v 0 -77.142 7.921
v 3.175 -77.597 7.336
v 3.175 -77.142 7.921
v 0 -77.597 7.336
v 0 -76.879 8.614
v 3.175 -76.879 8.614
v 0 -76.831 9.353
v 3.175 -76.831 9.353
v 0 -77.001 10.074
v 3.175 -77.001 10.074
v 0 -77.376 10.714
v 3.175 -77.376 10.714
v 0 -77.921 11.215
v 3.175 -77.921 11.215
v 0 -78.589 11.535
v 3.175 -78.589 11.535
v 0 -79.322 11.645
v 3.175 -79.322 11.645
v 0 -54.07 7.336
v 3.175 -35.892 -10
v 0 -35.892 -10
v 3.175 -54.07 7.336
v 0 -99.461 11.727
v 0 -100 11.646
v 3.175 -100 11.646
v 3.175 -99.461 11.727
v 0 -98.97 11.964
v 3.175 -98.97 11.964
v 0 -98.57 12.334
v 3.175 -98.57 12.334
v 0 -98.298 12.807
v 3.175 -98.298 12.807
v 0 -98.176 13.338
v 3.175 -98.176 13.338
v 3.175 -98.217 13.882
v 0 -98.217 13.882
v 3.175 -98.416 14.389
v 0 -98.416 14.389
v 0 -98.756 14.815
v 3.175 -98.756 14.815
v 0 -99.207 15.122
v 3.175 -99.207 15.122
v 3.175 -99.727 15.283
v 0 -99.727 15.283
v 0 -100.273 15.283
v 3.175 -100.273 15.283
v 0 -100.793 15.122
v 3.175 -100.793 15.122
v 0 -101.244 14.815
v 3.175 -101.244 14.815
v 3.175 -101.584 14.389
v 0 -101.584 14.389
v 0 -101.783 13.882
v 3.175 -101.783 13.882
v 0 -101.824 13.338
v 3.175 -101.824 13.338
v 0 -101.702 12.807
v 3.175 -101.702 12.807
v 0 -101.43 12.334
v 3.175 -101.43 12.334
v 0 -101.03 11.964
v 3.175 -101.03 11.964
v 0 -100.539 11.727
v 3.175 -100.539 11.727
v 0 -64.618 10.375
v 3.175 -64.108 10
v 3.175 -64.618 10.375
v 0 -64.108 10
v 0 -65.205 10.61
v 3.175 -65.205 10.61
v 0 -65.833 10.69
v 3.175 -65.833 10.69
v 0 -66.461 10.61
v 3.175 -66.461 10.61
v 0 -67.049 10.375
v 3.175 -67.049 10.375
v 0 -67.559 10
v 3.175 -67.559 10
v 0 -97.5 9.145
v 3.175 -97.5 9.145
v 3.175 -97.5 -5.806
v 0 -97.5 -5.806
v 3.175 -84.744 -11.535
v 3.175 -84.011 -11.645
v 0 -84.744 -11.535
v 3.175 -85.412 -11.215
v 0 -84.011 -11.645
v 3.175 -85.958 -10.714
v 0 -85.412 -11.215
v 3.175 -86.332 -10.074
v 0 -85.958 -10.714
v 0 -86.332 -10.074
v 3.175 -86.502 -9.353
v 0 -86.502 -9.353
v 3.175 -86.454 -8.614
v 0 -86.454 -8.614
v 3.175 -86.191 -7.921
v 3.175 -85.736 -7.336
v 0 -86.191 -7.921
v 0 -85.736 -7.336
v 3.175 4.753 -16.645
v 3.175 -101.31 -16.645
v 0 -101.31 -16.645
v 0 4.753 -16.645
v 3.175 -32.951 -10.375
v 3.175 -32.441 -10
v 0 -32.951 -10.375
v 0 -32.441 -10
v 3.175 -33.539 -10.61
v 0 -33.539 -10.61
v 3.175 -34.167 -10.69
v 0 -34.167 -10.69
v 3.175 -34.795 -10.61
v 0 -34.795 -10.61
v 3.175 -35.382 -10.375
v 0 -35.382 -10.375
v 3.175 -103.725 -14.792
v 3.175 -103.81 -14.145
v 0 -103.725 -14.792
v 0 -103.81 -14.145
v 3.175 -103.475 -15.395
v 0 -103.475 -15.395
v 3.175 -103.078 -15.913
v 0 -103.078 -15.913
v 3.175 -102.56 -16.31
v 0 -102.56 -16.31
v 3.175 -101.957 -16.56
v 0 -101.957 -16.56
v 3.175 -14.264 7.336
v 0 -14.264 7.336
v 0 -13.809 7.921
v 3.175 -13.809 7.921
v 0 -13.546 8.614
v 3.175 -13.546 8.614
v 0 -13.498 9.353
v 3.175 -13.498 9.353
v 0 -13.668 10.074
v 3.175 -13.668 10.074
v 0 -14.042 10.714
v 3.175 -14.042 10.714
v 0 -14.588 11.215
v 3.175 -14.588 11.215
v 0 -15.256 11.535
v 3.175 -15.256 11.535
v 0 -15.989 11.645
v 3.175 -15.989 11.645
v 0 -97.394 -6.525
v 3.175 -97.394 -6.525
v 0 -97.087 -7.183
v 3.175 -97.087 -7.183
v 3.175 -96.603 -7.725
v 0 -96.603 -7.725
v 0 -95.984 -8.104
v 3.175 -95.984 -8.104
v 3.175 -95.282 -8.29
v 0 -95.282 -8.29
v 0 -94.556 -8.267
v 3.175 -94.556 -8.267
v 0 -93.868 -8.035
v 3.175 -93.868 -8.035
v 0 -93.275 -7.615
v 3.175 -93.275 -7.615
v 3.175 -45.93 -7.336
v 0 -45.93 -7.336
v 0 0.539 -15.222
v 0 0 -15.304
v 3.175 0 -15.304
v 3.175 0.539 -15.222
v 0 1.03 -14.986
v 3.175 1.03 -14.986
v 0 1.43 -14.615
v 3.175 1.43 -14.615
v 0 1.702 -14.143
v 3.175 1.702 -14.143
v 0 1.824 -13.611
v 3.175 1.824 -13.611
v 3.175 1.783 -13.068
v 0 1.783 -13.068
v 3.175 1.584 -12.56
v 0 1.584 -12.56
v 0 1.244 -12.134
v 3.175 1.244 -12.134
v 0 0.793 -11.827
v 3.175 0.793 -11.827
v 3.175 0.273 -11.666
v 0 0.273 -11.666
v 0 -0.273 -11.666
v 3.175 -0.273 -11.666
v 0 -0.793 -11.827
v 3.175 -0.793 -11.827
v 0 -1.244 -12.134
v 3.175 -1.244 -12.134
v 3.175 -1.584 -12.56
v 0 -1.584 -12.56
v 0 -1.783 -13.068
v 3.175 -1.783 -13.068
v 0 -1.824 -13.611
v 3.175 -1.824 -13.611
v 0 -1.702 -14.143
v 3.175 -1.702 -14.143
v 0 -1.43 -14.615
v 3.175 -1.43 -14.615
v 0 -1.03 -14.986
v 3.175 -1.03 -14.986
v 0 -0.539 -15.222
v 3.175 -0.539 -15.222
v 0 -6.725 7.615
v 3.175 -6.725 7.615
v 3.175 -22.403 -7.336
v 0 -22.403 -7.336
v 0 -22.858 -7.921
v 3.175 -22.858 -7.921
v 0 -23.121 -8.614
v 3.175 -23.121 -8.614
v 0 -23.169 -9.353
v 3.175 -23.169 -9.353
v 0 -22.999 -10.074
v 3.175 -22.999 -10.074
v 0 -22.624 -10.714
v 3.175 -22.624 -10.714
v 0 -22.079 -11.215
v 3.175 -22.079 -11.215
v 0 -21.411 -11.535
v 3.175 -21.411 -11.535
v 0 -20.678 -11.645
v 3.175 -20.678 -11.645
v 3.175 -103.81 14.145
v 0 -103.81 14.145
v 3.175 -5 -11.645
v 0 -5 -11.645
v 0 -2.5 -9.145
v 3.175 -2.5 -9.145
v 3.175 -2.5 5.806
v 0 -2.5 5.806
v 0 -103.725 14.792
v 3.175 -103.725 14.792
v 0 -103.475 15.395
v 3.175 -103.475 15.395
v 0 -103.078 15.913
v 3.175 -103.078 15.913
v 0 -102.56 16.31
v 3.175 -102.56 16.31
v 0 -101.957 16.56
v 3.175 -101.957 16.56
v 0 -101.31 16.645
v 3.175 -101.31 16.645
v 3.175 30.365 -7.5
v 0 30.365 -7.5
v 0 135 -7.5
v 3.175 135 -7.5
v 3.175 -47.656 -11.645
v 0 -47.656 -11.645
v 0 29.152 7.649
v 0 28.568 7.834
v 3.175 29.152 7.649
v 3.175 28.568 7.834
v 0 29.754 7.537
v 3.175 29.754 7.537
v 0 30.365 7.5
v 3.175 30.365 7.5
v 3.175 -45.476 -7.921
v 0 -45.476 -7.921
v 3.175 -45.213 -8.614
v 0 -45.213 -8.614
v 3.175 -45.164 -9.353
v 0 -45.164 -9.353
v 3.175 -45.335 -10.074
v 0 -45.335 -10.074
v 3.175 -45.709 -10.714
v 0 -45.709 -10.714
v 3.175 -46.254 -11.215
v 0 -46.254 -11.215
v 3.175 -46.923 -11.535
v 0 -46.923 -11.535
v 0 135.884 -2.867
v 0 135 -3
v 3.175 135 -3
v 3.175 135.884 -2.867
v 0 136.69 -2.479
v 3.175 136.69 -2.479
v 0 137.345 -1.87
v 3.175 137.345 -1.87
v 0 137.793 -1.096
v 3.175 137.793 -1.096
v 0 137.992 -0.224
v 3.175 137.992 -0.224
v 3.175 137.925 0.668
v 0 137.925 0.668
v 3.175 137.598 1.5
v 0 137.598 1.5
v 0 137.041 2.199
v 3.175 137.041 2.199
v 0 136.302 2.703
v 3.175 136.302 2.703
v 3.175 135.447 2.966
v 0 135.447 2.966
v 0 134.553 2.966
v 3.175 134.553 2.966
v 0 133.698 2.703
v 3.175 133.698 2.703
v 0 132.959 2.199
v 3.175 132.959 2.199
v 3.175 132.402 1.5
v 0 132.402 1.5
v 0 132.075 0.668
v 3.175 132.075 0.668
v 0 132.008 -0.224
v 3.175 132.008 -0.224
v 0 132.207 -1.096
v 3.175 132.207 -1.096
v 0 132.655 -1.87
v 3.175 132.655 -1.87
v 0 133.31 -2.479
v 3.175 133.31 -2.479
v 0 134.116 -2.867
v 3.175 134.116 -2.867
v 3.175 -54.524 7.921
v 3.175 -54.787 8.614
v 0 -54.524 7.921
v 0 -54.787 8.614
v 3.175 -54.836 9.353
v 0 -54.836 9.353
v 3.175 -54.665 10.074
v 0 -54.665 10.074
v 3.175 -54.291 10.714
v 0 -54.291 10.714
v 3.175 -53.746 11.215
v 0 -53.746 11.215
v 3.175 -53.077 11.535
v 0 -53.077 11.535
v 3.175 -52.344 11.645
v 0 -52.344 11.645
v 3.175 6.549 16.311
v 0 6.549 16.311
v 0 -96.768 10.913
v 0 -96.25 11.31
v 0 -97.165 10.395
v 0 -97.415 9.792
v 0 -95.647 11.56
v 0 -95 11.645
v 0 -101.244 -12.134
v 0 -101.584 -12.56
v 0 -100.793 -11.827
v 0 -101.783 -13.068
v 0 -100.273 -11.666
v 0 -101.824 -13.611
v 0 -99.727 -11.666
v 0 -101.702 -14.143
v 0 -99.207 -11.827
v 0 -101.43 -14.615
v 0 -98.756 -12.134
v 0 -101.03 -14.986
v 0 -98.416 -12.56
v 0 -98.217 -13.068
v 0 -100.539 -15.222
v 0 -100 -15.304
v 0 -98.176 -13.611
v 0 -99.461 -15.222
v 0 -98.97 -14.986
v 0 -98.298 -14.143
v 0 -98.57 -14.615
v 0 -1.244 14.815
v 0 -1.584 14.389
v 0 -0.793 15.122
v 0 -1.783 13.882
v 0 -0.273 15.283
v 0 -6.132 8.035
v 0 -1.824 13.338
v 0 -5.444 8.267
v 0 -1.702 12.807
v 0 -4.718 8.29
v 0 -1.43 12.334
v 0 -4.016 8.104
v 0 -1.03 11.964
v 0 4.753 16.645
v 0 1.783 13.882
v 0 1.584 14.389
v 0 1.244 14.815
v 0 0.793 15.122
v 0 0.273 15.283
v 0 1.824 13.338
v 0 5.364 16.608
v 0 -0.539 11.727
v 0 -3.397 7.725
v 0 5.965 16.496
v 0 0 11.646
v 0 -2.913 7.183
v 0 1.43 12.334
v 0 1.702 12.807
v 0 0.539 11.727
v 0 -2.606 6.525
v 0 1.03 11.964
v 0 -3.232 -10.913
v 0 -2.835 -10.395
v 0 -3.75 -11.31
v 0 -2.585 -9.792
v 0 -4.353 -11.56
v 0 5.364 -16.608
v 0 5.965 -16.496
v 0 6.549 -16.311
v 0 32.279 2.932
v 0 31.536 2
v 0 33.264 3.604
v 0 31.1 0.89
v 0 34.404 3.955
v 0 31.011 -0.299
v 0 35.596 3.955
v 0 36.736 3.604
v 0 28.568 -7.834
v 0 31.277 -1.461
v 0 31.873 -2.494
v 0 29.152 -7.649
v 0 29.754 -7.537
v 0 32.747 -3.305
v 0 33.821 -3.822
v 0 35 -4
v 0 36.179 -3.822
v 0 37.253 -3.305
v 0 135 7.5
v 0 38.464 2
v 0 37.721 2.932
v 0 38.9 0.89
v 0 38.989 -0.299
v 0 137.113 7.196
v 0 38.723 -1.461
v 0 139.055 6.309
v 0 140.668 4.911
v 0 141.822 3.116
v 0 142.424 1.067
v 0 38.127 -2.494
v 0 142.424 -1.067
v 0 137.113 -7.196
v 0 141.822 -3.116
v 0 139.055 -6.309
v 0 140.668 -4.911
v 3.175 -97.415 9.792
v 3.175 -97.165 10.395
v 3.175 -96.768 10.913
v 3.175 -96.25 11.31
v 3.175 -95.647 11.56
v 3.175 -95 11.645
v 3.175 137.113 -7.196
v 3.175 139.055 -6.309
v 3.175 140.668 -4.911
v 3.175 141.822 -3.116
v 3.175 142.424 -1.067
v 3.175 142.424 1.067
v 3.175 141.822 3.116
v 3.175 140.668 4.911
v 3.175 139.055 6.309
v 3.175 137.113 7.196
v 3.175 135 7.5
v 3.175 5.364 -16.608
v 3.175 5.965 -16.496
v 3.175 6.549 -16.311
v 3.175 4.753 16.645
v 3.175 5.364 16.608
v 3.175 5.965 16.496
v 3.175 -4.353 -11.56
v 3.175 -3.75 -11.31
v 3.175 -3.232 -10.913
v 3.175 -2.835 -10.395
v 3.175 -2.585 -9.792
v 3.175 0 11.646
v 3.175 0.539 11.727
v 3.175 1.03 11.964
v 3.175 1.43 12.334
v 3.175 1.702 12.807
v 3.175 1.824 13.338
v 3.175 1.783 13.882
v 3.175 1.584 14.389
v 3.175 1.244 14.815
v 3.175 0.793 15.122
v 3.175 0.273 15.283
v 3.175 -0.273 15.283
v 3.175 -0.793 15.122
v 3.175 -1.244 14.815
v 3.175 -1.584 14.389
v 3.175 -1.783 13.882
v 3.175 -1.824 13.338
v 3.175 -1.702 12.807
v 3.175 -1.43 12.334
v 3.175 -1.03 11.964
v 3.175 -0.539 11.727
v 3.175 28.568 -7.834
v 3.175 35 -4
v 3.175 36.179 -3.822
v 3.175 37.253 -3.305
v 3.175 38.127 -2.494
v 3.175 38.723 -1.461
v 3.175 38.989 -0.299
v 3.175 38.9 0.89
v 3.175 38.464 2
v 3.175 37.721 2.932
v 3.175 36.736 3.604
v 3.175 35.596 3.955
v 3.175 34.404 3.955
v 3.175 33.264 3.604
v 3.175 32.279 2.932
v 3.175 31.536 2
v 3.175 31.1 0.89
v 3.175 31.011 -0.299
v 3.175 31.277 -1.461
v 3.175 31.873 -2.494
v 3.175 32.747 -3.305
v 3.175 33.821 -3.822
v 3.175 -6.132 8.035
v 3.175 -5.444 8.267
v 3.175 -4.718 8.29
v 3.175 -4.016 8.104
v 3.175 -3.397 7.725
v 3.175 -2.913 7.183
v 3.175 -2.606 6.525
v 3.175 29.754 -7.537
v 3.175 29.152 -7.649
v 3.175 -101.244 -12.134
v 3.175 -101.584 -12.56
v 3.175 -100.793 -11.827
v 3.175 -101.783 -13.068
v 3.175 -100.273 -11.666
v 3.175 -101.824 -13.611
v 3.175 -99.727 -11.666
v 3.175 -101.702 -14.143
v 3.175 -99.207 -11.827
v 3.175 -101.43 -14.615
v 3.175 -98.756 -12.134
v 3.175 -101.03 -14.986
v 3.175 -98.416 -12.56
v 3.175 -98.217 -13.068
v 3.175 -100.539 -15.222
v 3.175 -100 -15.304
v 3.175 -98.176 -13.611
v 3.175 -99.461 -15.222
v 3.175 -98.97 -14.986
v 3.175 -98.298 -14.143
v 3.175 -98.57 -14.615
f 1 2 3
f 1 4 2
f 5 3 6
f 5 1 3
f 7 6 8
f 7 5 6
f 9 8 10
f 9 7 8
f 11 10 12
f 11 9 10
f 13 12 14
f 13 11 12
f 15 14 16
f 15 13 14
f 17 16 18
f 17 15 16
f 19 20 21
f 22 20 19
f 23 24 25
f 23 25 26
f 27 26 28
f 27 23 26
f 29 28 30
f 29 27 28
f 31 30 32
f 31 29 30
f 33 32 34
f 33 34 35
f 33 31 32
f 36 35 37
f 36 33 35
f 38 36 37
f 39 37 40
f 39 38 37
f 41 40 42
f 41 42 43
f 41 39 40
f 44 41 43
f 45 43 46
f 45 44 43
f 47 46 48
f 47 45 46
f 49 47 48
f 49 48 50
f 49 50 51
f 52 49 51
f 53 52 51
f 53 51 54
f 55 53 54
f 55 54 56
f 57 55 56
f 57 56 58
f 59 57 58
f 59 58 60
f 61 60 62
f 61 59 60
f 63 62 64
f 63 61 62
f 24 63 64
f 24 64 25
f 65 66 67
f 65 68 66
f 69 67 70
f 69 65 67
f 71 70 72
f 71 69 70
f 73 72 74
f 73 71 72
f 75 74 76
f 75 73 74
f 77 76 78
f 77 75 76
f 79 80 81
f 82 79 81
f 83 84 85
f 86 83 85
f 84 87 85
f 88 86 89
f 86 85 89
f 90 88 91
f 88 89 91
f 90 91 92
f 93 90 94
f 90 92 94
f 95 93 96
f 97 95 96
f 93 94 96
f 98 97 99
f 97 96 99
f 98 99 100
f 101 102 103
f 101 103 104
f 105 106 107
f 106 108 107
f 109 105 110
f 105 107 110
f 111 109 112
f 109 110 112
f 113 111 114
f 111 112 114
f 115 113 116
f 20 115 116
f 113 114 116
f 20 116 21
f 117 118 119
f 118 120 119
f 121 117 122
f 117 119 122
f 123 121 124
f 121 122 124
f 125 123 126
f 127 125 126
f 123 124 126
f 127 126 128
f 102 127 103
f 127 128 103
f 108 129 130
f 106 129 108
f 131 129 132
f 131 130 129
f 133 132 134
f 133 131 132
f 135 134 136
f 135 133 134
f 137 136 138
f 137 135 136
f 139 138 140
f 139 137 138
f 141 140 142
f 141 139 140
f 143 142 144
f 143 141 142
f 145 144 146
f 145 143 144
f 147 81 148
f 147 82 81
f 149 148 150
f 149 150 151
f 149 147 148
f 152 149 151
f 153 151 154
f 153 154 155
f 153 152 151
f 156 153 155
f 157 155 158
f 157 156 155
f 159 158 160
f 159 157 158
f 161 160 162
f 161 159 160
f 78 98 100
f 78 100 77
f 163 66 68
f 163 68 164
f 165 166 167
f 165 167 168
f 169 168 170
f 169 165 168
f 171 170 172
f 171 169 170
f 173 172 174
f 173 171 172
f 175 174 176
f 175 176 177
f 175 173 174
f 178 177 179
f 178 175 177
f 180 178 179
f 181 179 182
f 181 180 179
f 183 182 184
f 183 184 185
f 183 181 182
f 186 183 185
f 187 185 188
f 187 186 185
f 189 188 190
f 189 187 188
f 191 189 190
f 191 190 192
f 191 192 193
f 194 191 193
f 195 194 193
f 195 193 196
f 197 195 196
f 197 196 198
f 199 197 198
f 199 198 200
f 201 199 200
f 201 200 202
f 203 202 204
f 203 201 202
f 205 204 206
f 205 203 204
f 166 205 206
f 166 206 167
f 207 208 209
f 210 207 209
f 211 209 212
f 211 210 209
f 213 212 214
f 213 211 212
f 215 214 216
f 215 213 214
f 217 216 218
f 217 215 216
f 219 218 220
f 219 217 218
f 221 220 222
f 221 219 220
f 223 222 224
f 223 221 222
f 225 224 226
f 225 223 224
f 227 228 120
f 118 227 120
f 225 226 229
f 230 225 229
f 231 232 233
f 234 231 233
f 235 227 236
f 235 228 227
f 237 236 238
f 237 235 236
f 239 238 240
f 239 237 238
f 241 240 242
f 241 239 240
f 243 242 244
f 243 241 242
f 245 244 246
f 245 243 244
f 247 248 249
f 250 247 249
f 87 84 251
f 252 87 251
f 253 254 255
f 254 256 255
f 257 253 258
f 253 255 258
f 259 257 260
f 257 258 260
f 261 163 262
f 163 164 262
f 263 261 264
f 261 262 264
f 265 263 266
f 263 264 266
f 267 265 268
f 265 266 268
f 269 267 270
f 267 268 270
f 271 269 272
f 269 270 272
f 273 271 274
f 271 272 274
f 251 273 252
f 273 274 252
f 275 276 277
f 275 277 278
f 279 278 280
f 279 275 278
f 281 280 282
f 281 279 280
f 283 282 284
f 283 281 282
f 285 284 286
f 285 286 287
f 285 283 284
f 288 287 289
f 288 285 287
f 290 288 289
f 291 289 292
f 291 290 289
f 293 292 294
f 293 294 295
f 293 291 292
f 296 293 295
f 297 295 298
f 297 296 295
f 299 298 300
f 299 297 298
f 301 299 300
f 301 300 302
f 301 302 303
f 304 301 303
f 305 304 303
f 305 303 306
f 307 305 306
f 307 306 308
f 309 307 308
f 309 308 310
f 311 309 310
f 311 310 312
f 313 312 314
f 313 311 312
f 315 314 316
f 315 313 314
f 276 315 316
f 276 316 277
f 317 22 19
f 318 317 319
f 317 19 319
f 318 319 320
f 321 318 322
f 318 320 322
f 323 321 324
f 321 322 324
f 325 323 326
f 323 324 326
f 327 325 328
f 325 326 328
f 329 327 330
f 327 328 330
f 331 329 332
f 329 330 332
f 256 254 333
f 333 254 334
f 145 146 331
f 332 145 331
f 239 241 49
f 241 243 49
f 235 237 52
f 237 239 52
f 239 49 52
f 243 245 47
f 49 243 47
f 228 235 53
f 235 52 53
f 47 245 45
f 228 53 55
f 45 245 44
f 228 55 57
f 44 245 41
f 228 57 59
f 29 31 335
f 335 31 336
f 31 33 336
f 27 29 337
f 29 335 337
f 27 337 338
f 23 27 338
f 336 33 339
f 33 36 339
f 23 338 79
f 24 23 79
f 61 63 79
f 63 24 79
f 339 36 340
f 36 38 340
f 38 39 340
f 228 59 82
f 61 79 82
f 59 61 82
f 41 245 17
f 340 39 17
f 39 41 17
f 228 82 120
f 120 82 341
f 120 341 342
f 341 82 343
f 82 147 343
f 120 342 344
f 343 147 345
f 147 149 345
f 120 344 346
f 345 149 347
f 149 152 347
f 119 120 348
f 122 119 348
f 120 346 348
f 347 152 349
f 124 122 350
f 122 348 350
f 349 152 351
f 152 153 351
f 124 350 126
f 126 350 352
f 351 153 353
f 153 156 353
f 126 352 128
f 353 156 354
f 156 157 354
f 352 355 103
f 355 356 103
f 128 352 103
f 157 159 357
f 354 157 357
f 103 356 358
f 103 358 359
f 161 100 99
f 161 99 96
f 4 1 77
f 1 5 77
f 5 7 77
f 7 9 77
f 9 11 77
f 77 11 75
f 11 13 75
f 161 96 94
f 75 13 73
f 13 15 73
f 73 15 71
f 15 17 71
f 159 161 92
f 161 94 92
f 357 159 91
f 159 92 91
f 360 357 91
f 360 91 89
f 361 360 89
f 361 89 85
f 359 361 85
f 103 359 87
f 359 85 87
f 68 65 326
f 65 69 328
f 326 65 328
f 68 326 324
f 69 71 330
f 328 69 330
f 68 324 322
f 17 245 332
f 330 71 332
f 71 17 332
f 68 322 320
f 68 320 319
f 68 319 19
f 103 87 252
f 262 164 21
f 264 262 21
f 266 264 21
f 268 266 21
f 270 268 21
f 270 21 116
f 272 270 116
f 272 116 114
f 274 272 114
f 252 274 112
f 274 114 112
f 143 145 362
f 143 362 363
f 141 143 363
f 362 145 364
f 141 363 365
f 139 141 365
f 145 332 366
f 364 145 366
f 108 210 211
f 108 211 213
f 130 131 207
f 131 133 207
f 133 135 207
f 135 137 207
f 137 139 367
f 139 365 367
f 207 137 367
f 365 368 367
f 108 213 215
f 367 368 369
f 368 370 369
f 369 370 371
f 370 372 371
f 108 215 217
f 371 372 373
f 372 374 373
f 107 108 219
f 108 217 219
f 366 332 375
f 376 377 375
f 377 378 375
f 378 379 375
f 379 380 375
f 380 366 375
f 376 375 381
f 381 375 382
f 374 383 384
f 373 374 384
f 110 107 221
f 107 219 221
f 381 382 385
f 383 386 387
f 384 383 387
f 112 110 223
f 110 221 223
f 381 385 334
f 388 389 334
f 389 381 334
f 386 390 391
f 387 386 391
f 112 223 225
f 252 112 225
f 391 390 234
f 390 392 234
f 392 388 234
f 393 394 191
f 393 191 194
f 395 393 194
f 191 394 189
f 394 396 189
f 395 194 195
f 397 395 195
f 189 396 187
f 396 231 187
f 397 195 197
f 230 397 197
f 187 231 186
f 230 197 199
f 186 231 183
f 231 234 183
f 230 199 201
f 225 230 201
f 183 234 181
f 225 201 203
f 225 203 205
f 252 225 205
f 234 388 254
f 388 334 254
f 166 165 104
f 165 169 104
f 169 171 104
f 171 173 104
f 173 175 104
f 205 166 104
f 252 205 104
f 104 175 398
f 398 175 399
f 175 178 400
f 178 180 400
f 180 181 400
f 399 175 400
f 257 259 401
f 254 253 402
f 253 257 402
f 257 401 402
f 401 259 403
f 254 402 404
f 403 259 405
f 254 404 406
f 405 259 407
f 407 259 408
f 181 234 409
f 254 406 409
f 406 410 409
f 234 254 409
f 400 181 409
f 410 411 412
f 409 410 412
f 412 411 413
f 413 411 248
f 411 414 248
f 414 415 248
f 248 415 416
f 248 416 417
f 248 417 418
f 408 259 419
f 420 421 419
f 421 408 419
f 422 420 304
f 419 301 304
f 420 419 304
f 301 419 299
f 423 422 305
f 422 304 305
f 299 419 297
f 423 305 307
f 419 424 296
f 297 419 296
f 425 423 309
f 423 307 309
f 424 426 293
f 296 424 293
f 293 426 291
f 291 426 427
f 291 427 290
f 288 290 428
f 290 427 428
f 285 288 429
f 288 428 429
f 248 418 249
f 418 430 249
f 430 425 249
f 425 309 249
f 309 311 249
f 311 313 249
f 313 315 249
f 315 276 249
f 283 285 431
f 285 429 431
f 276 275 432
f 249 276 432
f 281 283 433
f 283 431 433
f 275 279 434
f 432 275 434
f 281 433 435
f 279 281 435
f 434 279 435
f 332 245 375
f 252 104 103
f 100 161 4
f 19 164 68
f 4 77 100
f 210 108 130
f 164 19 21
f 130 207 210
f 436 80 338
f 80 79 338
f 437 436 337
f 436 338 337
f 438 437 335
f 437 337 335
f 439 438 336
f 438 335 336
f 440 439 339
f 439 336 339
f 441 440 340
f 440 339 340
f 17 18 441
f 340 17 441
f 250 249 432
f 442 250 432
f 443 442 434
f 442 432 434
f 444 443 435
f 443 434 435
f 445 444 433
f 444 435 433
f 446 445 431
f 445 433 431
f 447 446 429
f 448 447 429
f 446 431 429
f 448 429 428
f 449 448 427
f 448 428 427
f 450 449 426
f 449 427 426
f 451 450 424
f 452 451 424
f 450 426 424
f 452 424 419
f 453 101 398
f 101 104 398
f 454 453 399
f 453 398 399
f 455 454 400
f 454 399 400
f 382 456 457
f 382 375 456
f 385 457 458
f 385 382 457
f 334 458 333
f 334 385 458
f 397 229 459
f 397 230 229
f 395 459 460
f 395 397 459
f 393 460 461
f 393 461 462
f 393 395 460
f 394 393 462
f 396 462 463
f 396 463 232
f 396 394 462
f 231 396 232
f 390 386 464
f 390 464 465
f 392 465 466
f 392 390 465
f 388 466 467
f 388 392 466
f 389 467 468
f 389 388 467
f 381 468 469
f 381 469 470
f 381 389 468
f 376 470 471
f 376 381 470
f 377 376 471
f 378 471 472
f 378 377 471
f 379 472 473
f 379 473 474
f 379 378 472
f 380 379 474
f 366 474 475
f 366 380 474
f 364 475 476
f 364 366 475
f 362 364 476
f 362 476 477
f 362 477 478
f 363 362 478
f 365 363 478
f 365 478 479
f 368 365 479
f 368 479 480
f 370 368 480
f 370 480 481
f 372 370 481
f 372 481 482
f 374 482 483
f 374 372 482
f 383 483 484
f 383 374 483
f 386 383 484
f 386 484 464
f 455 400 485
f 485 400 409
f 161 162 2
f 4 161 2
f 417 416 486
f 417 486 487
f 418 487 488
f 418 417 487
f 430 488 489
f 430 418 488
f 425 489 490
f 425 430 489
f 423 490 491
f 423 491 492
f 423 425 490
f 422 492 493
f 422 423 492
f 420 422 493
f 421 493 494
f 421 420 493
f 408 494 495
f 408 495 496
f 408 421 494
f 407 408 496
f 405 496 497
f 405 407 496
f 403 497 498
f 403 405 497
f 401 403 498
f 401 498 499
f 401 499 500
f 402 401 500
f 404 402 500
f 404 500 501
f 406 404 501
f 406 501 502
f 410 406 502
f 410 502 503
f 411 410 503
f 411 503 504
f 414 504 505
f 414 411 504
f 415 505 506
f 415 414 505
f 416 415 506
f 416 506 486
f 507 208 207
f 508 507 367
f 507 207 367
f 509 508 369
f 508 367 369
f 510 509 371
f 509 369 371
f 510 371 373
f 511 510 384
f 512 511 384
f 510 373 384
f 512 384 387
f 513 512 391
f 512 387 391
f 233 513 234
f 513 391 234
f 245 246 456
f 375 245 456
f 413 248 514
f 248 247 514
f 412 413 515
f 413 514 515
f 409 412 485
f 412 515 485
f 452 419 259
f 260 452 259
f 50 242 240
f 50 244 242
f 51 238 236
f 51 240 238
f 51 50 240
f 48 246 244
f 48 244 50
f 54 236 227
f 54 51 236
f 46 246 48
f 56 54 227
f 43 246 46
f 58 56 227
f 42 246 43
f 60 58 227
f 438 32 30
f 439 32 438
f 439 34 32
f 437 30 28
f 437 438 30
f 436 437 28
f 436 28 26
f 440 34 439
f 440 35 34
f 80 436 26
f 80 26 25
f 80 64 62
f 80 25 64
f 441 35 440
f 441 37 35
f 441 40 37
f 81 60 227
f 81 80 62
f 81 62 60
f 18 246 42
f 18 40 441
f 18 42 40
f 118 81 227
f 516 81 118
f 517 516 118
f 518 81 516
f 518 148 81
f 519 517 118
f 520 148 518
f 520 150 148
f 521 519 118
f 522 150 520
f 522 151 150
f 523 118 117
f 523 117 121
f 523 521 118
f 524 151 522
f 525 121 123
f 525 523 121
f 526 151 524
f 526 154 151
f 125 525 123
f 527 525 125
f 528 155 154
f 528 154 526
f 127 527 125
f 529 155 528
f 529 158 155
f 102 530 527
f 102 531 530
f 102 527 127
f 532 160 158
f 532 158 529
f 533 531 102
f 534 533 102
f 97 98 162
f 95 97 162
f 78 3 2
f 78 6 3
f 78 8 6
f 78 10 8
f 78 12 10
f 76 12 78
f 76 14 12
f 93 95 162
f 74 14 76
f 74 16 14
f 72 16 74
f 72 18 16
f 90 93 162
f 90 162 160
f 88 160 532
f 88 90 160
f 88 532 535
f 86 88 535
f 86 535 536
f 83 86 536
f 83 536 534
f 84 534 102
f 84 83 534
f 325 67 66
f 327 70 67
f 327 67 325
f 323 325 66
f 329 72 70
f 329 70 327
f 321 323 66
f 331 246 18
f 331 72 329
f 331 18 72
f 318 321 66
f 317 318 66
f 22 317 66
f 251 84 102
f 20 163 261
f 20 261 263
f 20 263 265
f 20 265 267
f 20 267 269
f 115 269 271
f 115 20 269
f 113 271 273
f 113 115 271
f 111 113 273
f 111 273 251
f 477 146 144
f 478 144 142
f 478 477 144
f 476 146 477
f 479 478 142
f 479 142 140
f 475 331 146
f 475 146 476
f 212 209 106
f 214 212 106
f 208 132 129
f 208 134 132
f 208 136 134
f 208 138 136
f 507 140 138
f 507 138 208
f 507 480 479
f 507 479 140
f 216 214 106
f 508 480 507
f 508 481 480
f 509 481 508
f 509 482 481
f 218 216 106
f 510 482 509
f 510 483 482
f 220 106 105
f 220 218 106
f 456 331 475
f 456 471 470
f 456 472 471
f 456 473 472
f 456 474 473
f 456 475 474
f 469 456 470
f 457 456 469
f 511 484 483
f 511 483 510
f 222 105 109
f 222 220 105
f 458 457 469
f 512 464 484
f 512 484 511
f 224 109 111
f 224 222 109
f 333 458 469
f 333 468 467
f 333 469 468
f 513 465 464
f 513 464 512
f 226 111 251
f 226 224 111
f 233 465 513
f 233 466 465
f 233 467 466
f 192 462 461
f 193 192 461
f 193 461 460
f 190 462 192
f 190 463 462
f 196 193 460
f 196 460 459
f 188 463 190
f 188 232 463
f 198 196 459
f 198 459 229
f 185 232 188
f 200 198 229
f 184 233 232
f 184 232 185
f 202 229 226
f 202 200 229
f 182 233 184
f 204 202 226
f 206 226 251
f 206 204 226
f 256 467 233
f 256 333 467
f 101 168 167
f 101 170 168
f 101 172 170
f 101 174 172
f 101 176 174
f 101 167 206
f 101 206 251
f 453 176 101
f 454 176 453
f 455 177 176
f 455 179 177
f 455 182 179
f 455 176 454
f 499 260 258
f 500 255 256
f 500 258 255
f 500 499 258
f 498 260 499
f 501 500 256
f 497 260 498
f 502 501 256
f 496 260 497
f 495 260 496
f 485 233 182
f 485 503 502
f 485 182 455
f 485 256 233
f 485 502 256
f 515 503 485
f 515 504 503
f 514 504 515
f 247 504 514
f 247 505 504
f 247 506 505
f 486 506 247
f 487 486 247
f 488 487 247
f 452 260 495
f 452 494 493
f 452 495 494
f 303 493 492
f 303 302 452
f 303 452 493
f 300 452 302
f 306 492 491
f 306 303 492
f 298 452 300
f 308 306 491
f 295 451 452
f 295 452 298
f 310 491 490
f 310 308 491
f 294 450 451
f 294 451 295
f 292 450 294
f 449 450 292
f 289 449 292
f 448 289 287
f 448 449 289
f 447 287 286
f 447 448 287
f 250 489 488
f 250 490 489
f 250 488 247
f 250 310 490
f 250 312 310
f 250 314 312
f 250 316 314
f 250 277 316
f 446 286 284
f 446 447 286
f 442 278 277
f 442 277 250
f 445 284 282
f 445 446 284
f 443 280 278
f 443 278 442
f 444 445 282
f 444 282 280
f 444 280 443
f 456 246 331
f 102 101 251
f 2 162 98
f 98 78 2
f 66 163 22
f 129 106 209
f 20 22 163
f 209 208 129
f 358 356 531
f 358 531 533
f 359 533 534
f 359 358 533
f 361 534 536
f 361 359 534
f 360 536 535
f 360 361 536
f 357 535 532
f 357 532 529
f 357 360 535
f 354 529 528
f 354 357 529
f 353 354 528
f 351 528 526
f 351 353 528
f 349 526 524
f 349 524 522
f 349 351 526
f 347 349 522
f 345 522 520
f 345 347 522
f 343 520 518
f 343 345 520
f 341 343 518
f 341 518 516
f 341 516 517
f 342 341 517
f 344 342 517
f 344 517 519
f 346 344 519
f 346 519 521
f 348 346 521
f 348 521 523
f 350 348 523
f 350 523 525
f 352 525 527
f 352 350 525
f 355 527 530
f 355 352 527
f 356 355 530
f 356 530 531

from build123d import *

# Parameters (mm, degrees)
SKETCH1_R           = 1.8288
SKETCH1_R_2         = 4
SKETCH1_R_3         = 3
BOSS_EXTRUDE1_DEPTH = 3.175
CUT_EXTRUDE1_REACH  = 146.039
SKETCH2_W           = 4.112404804
SKETCH2_H           = 133.245584328
FILLET3_R           = 2.5
FILLET4_R           = 5


with BuildPart() as part:
    # Sketch1 → Boss-Extrude1 (new body)
    with BuildSketch(Plane(origin=(0, 0, 0), x_dir=(0, 0, -1), z_dir=(1, 0, 0))):
        with BuildLine():
            Line((20.757404804, -103.81), (20.757404804, -5))
            Line((20.757404804, -5), (7.5, 29.435584328))
            Line((7.5, 29.435584328), (7.5, 135))
            ThreePointArc((7.5, 135), (0, 142.5), (-7.5, 135))
            Line((-7.5, 135), (-7.5, 29.435584328))
            Line((-7.5, 29.435584328), (-20.757404804, -5))
            Line((-20.757404804, -5), (-20.757404804, -103.81))
            Line((-20.757404804, -103.81), (20.757404804, -103.81))
        make_face()
        with Locations((-13.4747, -100)):
            Circle(SKETCH1_R, mode=Mode.SUBTRACT)
        with Locations((13.4747, -100)):
            Circle(SKETCH1_R, mode=Mode.SUBTRACT)
        with Locations((13.4747, 0)):
            Circle(SKETCH1_R, mode=Mode.SUBTRACT)
        with Locations((-13.4747, 0)):
            Circle(SKETCH1_R, mode=Mode.SUBTRACT)
        with Locations((0, 35)):
            Circle(SKETCH1_R_2, mode=Mode.SUBTRACT)
        with Locations((0, 135)):
            Circle(SKETCH1_R_3, mode=Mode.SUBTRACT)
    extrude(amount=BOSS_EXTRUDE1_DEPTH)

    # Sketch2 → Cut-Extrude1 (cut, up to next)
    with BuildSketch(Plane(origin=(3.175, 0, 0), x_dir=(0, 0, -1), z_dir=(1, 0, 0)), mode=Mode.PRIVATE) as cut_extrude1_sk1:
        Polygon((11.645, -2.5), (-11.645, -2.5), (11.645, -26.921755536), align=None)
    cut_extrude1_tool1 = extrude(cut_extrude1_sk1.sketch, amount=-CUT_EXTRUDE1_REACH, mode=Mode.PRIVATE) & part.part
    # Sketch2 → Cut-Extrude1 (cut, up to next)
    with BuildSketch(Plane(origin=(3.175, 0, 0), x_dir=(0, 0, -1), z_dir=(1, 0, 0)), mode=Mode.PRIVATE) as cut_extrude1_sk2:
        Polygon((-11.645, -9.744911131), (11.645, -34.166666667), (-11.645, -58.588422203), (-11.645, -34.166666667), align=None)
    cut_extrude1_tool2 = extrude(cut_extrude1_sk2.sketch, amount=-CUT_EXTRUDE1_REACH, mode=Mode.PRIVATE) & part.part
    # Sketch2 → Cut-Extrude1 (cut, up to next)
    with BuildSketch(Plane(origin=(3.175, 0, 0), x_dir=(0, 0, -1), z_dir=(1, 0, 0)), mode=Mode.PRIVATE) as cut_extrude1_sk3:
        Polygon((-11.645, -73.078244464), (-11.645, -97.5), (11.645, -97.5), align=None)
    cut_extrude1_tool3 = extrude(cut_extrude1_sk3.sketch, amount=-CUT_EXTRUDE1_REACH, mode=Mode.PRIVATE) & part.part
    # Sketch2 → Cut-Extrude1 (cut, up to next)
    with BuildSketch(Plane(origin=(3.175, 0, 0), x_dir=(0, 0, -1), z_dir=(1, 0, 0)), mode=Mode.PRIVATE) as cut_extrude1_sk4:
        Polygon((11.645, -41.411577797), (11.645, -65.833333333), (11.645, -90.255088869), (-11.645, -65.833333333), align=None)
    cut_extrude1_tool4 = extrude(cut_extrude1_sk4.sketch, amount=-CUT_EXTRUDE1_REACH, mode=Mode.PRIVATE) & part.part
    # Sketch2 → Cut-Extrude1 (cut, up to next)
    with BuildSketch(Plane(origin=(3.175, 0, 0), x_dir=(0, 0, -1), z_dir=(1, 0, 0)), mode=Mode.PRIVATE) as cut_extrude1_sk5:
        with Locations((-18.701202402, -37.187207836)):
            Rectangle(SKETCH2_W, SKETCH2_H)
    cut_extrude1_tool5 = extrude(cut_extrude1_sk5.sketch, amount=-CUT_EXTRUDE1_REACH, mode=Mode.PRIVATE) & part.part
    # Sketch2 → Cut-Extrude1 (cut, up to next)
    with BuildSketch(Plane(origin=(3.175, 0, 0), x_dir=(0, 0, -1), z_dir=(1, 0, 0)), mode=Mode.PRIVATE) as cut_extrude1_sk6:
        with Locations((18.701202402, -37.187207836)):
            Rectangle(SKETCH2_W, SKETCH2_H)
    cut_extrude1_tool6 = extrude(cut_extrude1_sk6.sketch, amount=-CUT_EXTRUDE1_REACH, mode=Mode.PRIVATE) & part.part
    add(cut_extrude1_tool1.solids().sort_by_distance((3.175, -10.640585, -3.881667))[0], mode=Mode.SUBTRACT)
    add(cut_extrude1_tool2.solids().sort_by_distance((3.175, -34.166667, 3.881667))[0], mode=Mode.SUBTRACT)
    add(cut_extrude1_tool3.solids().sort_by_distance((3.175, -89.359415, 3.881667))[0], mode=Mode.SUBTRACT)
    add(cut_extrude1_tool4.solids().sort_by_distance((3.175, -65.833333, -3.881667))[0], mode=Mode.SUBTRACT)
    add(cut_extrude1_tool5.solids().sort_by_distance((3.175, -37.187208, 18.701202))[0], mode=Mode.SUBTRACT)
    add(cut_extrude1_tool6.solids().sort_by_distance((3.175, -37.187208, -18.701202))[0], mode=Mode.SUBTRACT)

    # Fillet3
    fillet3_edges = [part.edges().sort_by_distance(p)[0] for p in [
        (1.5875, -26.921755536, -11.645),
        (1.5875, -2.5, 11.645),
        (1.5875, -2.5, -11.645),
        (1.5875, -103.81, 16.645),
        (1.5875, -9.744911131, 11.645),
        (1.5875, -34.166666667, -11.645),
        (1.5875, -58.588422203, 11.645),
        (1.5875, -103.81, -16.645),
        (1.5875, -73.078244464, 11.645),
        (1.5875, -97.5, -11.645),
        (1.5875, -97.5, 11.645),
        (1.5875, -90.255088869, -11.645),
        (1.5875, -65.833333333, 11.645),
        (1.5875, -41.411577797, -11.645),
    ]]
    fillet(fillet3_edges, radius=FILLET3_R)

    # Fillet4
    fillet4_edges = [part.edges().sort_by_distance(p)[0] for p in [
        (1.5875, 29.435584328, -7.5),
        (1.5875, 29.435584328, 7.5),
        (1.5875, 5.681808734, 16.645),
        (1.5875, 5.681808734, -16.645),
    ]]
    fillet(fillet4_edges, radius=FILLET4_R)


solid = part.part
